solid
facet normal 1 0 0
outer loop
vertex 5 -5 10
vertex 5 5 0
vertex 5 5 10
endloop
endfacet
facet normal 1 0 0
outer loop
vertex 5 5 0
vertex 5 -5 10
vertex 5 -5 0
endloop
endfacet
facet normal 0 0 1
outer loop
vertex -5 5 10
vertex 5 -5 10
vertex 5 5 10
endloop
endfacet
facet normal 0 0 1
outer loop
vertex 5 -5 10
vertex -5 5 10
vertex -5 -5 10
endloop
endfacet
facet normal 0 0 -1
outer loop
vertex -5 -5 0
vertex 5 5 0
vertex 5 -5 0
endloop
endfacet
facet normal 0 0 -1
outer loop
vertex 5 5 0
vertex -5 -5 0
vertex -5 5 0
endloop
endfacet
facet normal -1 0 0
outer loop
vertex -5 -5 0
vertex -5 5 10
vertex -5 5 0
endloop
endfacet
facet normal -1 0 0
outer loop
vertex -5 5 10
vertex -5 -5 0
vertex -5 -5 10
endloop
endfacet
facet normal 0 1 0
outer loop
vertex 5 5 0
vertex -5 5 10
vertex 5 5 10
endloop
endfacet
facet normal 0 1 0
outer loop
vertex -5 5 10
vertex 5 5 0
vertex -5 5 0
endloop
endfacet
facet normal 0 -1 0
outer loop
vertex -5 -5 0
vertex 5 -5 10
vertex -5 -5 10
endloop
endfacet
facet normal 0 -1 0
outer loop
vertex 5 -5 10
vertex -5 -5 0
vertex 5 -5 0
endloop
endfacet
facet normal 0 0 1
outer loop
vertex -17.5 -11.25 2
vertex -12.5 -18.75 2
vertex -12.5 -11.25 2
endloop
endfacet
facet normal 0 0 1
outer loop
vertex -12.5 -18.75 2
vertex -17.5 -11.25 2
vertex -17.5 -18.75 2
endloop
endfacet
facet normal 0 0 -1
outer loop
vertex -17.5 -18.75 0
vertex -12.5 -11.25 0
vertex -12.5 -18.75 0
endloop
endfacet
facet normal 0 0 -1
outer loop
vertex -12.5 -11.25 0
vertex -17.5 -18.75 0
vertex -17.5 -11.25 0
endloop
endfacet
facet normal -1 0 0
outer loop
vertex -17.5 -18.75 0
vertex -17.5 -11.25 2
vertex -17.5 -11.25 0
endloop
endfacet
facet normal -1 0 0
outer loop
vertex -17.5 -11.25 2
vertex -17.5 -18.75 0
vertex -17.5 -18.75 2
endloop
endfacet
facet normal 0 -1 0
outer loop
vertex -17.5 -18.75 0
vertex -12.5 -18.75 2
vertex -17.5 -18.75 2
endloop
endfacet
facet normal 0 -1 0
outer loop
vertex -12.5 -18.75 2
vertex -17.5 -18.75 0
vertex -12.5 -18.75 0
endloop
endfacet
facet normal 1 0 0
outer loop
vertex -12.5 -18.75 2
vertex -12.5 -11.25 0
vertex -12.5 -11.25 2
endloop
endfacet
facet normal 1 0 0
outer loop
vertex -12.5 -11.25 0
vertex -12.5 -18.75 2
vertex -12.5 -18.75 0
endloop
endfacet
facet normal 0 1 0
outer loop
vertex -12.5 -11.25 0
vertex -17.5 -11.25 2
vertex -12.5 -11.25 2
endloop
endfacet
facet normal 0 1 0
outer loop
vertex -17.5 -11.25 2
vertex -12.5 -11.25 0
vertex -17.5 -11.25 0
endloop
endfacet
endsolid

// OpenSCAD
translate([0, 0, 5]) color([0,1,0,0.9]) cube([10, 10, 10], center=true);
translate([-17.25, -18.5, 1]) color([1,0,0]) cube([0.5, 0.5, 2], center=true);
translate([-16.75, -18.5, 1]) color([1,0,0]) cube([0.5, 0.5, 2], center=true);
translate([-16.25, -18.5, 1]) color([1,0,0]) cube([0.5, 0.5, 2], center=true);
translate([-15.75, -18.5, 1]) color([1,0,0]) cube([0.5, 0.5, 2], center=true);
translate([-15.25, -18.5, 1]) color([1,0,0]) cube([0.5, 0.5, 2], center=true);
translate([-14.75, -18.5, 1]) color([1,0,0]) cube([0.5, 0.5, 2], center=true);
translate([-14.25, -18.5, 1]) color([1,0,0]) cube([0.5, 0.5, 2], center=true);
translate([-13.75, -18.5, 1]) color([1,0,0]) cube([0.5, 0.5, 2], center=true);
translate([-13.25, -18.5, 1]) color([1,0,0]) cube([0.5, 0.5, 2], center=true);
translate([-12.75, -18.5, 1]) color([1,0,0]) cube([0.5, 0.5, 2], center=true);
translate([-17.25, -18.0, 1]) color([1,0,0]) cube([0.5, 0.5, 2], center=true);
translate([-16.75, -18.0, 1]) color([1,0,0]) cube([0.5, 0.5, 2], center=true);
translate([-16.25, -18.0, 1]) color([1,0,0]) cube([0.5, 0.5, 2], center=true);
translate([-15.75, -18.0, 1]) color([1,0,0]) cube([0.5, 0.5, 2], center=true);
translate([-15.25, -18.0, 1]) color([1,0,0]) cube([0.5, 0.5, 2], center=true);
translate([-14.75, -18.0, 1]) color([1,0,0]) cube([0.5, 0.5, 2], center=true);
translate([-14.25, -18.0, 1]) color([1,0,0]) cube([0.5, 0.5, 2], center=true);
translate([-13.75, -18.0, 1]) color([1,0,0]) cube([0.5, 0.5, 2], center=true);
translate([-13.25, -18.0, 1]) color([1,0,0]) cube([0.5, 0.5, 2], center=true);
translate([-12.75, -18.0, 1]) color([1,0,0]) cube([0.5, 0.5, 2], center=true);
translate([-17.25, -17.5, 1]) color([1,0,0]) cube([0.5, 0.5, 2], center=true);
translate([-16.75, -17.5, 1]) color([1,0,0]) cube([0.5, 0.5, 2], center=true);
translate([-16.25, -17.5, 1]) color([1,0,0]) cube([0.5, 0.5, 2], center=true);
translate([-15.75, -17.5, 1]) color([1,0,0]) cube([0.5, 0.5, 2], center=true);
translate([-15.25, -17.5, 1]) color([1,0,0]) cube([0.5, 0.5, 2], center=true);
translate([-14.75, -17.5, 1]) color([1,0,0]) cube([0.5, 0.5, 2], center=true);
translate([-14.25, -17.5, 1]) color([1,0,0]) cube([0.5, 0.5, 2], center=true);
translate([-13.75, -17.5, 1]) color([1,0,0]) cube([0.5, 0.5, 2], center=true);
translate([-13.25, -17.5, 1]) color([1,0,0]) cube([0.5, 0.5, 2], center=true);
translate([-12.75, -17.5, 1]) color([1,0,0]) cube([0.5, 0.5, 2], center=true);
translate([-17.25, -17.0, 1]) color([1,0,0]) cube([0.5, 0.5, 2], center=true);
translate([-16.75, -17.0, 1]) color([1,0,0]) cube([0.5, 0.5, 2], center=true);
translate([-16.25, -17.0, 1]) color([1,0,0]) cube([0.5, 0.5, 2], center=true);
translate([-15.75, -17.0, 1]) color([1,0,0]) cube([0.5, 0.5, 2], center=true);
translate([-15.25, -17.0, 1]) color([1,0,0]) cube([0.5, 0.5, 2], center=true);
translate([-14.75, -17.0, 1]) color([1,0,0]) cube([0.5, 0.5, 2], center=true);
translate([-14.25, -17.0, 1]) color([1,0,0]) cube([0.5, 0.5, 2], center=true);
translate([-13.75, -17.0, 1]) color([1,0,0]) cube([0.5, 0.5, 2], center=true);
translate([-13.25, -17.0, 1]) color([1,0,0]) cube([0.5, 0.5, 2], center=true);
translate([-12.75, -17.0, 1]) color([1,0,0]) cube([0.5, 0.5, 2], center=true);
translate([-17.25, -16.5, 1]) color([1,0,0]) cube([0.5, 0.5, 2], center=true);
translate([-16.75, -16.5, 1]) color([1,0,0]) cube([0.5, 0.5, 2], center=true);
translate([-16.25, -16.5, 1]) color([1,0,0]) cube([0.5, 0.5, 2], center=true);
translate([-15.75, -16.5, 1]) color([1,0,0]) cube([0.5, 0.5, 2], center=true);
translate([-15.25, -16.5, 1]) color([1,0,0]) cube([0.5, 0.5, 2], center=true);
translate([-14.75, -16.5, 1]) color([1,0,0]) cube([0.5, 0.5, 2], center=true);
translate([-14.25, -16.5, 1]) color([1,0,0]) cube([0.5, 0.5, 2], center=true);
translate([-13.75, -16.5, 1]) color([1,0,0]) cube([0.5, 0.5, 2], center=true);
translate([-13.25, -16.5, 1]) color([1,0,0]) cube([0.5, 0.5, 2], center=true);
translate([-12.75, -16.5, 1]) color([1,0,0]) cube([0.5, 0.5, 2], center=true);
translate([-17.25, -16.0, 1]) color([1,0,0]) cube([0.5, 0.5, 2], center=true);
translate([-16.75, -16.0, 1]) color([1,0,0]) cube([0.5, 0.5, 2], center=true);
translate([-16.25, -16.0, 1]) color([1,0,0]) cube([0.5, 0.5, 2], center=true);
translate([-15.75, -16.0, 1]) color([1,0,0]) cube([0.5, 0.5, 2], center=true);
translate([-15.25, -16.0, 1]) color([1,0,0]) cube([0.5, 0.5, 2], center=true);
translate([-14.75, -16.0, 1]) color([1,0,0]) cube([0.5, 0.5, 2], center=true);
translate([-14.25, -16.0, 1]) color([1,0,0]) cube([0.5, 0.5, 2], center=true);
translate([-13.75, -16.0, 1]) color([1,0,0]) cube([0.5, 0.5, 2], center=true);
translate([-13.25, -16.0, 1]) color([1,0,0]) cube([0.5, 0.5, 2], center=true);
translate([-12.75, -16.0, 1]) color([1,0,0]) cube([0.5, 0.5, 2], center=true);
translate([-17.25, -15.5, 1]) color([1,0,0]) cube([0.5, 0.5, 2], center=true);
translate([-16.75, -15.5, 1]) color([1,0,0]) cube([0.5, 0.5, 2], center=true);
translate([-16.25, -15.5, 1]) color([1,0,0]) cube([0.5, 0.5, 2], center=true);
translate([-15.75, -15.5, 1]) color([1,0,0]) cube([0.5, 0.5, 2], center=true);
translate([-15.25, -15.5, 1]) color([1,0,0]) cube([0.5, 0.5, 2], center=true);
translate([-14.75, -15.5, 1]) color([1,0,0]) cube([0.5, 0.5, 2], center=true);
translate([-14.25, -15.5, 1]) color([1,0,0]) cube([0.5, 0.5, 2], center=true);
translate([-13.75, -15.5, 1]) color([1,0,0]) cube([0.5, 0.5, 2], center=true);
translate([-13.25, -15.5, 1]) color([1,0,0]) cube([0.5, 0.5, 2], center=true);
translate([-12.75, -15.5, 1]) color([1,0,0]) cube([0.5, 0.5, 2], center=true);
translate([-17.25, -15.0, 1]) color([1,0,0]) cube([0.5, 0.5, 2], center=true);
translate([-16.75, -15.0, 1]) color([1,0,0]) cube([0.5, 0.5, 2], center=true);
translate([-16.25, -15.0, 1]) color([1,0,0]) cube([0.5, 0.5, 2], center=true);
translate([-15.75, -15.0, 1]) color([1,0,0]) cube([0.5, 0.5, 2], center=true);
translate([-15.25, -15.0, 1]) color([1,0,0]) cube([0.5, 0.5, 2], center=true);
translate([-14.75, -15.0, 1]) color([1,0,0]) cube([0.5, 0.5, 2], center=true);
translate([-14.25, -15.0, 1]) color([1,0,0]) cube([0.5, 0.5, 2], center=true);
translate([-13.75, -15.0, 1]) color([1,0,0]) cube([0.5, 0.5, 2], center=true);
translate([-13.25, -15.0, 1]) color([1,0,0]) cube([0.5, 0.5, 2], center=true);
translate([-12.75, -15.0, 1]) color([1,0,0]) cube([0.5, 0.5, 2], center=true);
translate([-17.25, -14.5, 1]) color([1,0,0]) cube([0.5, 0.5, 2], center=true);
translate([-16.75, -14.5, 1]) color([1,0,0]) cube([0.5, 0.5, 2], center=true);
translate([-16.25, -14.5, 1]) color([1,0,0]) cube([0.5, 0.5, 2], center=true);
translate([-15.75, -14.5, 1]) color([1,0,0]) cube([0.5, 0.5, 2], center=true);
translate([-15.25, -14.5, 1]) color([1,0,0]) cube([0.5, 0.5, 2], center=true);
translate([-14.75, -14.5, 1]) color([1,0,0]) cube([0.5, 0.5, 2], center=true);
translate([-14.25, -14.5, 1]) color([1,0,0]) cube([0.5, 0.5, 2], center=true);
translate([-13.75, -14.5, 1]) color([1,0,0]) cube([0.5, 0.5, 2], center=true);
translate([-13.25, -14.5, 1]) color([1,0,0]) cube([0.5, 0.5, 2], center=true);
translate([-12.75, -14.5, 1]) color([1,0,0]) cube([0.5, 0.5, 2], center=true);
translate([-17.25, -14.0, 1]) color([1,0,0]) cube([0.5, 0.5, 2], center=true);
translate([-16.75, -14.0, 1]) color([1,0,0]) cube([0.5, 0.5, 2], center=true);
translate([-16.25, -14.0, 1]) color([1,0,0]) cube([0.5, 0.5, 2], center=true);
translate([-15.75, -14.0, 1]) color([1,0,0]) cube([0.5, 0.5, 2], center=true);
translate([-15.25, -14.0, 1]) color([1,0,0]) cube([0.5, 0.5, 2], center=true);
translate([-14.75, -14.0, 1]) color([1,0,0]) cube([0.5, 0.5, 2], center=true);
translate([-14.25, -14.0, 1]) color([1,0,0]) cube([0.5, 0.5, 2], center=true);
translate([-13.75, -14.0, 1]) color([1,0,0]) cube([0.5, 0.5, 2], center=true);
translate([-13.25, -14.0, 1]) color([1,0,0]) cube([0.5, 0.5, 2], center=true);
translate([-12.75, -14.0, 1]) color([1,0,0]) cube([0.5, 0.5, 2], center=true);
translate([-17.25, -13.5, 1]) color([1,0,0]) cube([0.5, 0.5, 2], center=true);
translate([-16.75, -13.5, 1]) color([1,0,0]) cube([0.5, 0.5, 2], center=true);
translate([-16.25, -13.5, 1]) color([1,0,0]) cube([0.5, 0.5, 2], center=true);
translate([-15.75, -13.5, 1]) color([1,0,0]) cube([0.5, 0.5, 2], center=true);
translate([-15.25, -13.5, 1]) color([1,0,0]) cube([0.5, 0.5, 2], center=true);
translate([-14.75, -13.5, 1]) color([1,0,0]) cube([0.5, 0.5, 2], center=true);
translate([-14.25, -13.5, 1]) color([1,0,0]) cube([0.5, 0.5, 2], center=true);
translate([-13.75, -13.5, 1]) color([1,0,0]) cube([0.5, 0.5, 2], center=true);
translate([-13.25, -13.5, 1]) color([1,0,0]) cube([0.5, 0.5, 2], center=true);
translate([-12.75, -13.5, 1]) color([1,0,0]) cube([0.5, 0.5, 2], center=true);
translate([-17.25, -13.0, 1]) color([1,0,0]) cube([0.5, 0.5, 2], center=true);
translate([-16.75, -13.0, 1]) color([1,0,0]) cube([0.5, 0.5, 2], center=true);
translate([-16.25, -13.0, 1]) color([1,0,0]) cube([0.5, 0.5, 2], center=true);
translate([-15.75, -13.0, 1]) color([1,0,0]) cube([0.5, 0.5, 2], center=true);
translate([-15.25, -13.0, 1]) color([1,0,0]) cube([0.5, 0.5, 2], center=true);
translate([-14.75, -13.0, 1]) color([1,0,0]) cube([0.5, 0.5, 2], center=true);
translate([-14.25, -13.0, 1]) color([1,0,0]) cube([0.5, 0.5, 2], center=true);
translate([-13.75, -13.0, 1]) color([1,0,0]) cube([0.5, 0.5, 2], center=true);
translate([-13.25, -13.0, 1]) color([1,0,0]) cube([0.5, 0.5, 2], center=true);
translate([-12.75, -13.0, 1]) color([1,0,0]) cube([0.5, 0.5, 2], center=true);
translate([-17.25, -12.5, 1]) color([1,0,0]) cube([0.5, 0.5, 2], center=true);
translate([-16.75, -12.5, 1]) color([1,0,0]) cube([0.5, 0.5, 2], center=true);
translate([-16.25, -12.5, 1]) color([1,0,0]) cube([0.5, 0.5, 2], center=true);
translate([-15.75, -12.5, 1]) color([1,0,0]) cube([0.5, 0.5, 2], center=true);
translate([-15.25, -12.5, 1]) color([1,0,0]) cube([0.5, 0.5, 2], center=true);
translate([-14.75, -12.5, 1]) color([1,0,0]) cube([0.5, 0.5, 2], center=true);
translate([-14.25, -12.5, 1]) color([1,0,0]) cube([0.5, 0.5, 2], center=true);
translate([-13.75, -12.5, 1]) color([1,0,0]) cube([0.5, 0.5, 2], center=true);
translate([-13.25, -12.5, 1]) color([1,0,0]) cube([0.5, 0.5, 2], center=true);
translate([-12.75, -12.5, 1]) color([1,0,0]) cube([0.5, 0.5, 2], center=true);
translate([-17.25, -12.0, 1]) color([1,0,0]) cube([0.5, 0.5, 2], center=true);
translate([-16.75, -12.0, 1]) color([1,0,0]) cube([0.5, 0.5, 2], center=true);
translate([-16.25, -12.0, 1]) color([1,0,0]) cube([0.5, 0.5, 2], center=true);
translate([-15.75, -12.0, 1]) color([1,0,0]) cube([0.5, 0.5, 2], center=true);
translate([-15.25, -12.0, 1]) color([1,0,0]) cube([0.5, 0.5, 2], center=true);
translate([-14.75, -12.0, 1]) color([1,0,0]) cube([0.5, 0.5, 2], center=true);
translate([-14.25, -12.0, 1]) color([1,0,0]) cube([0.5, 0.5, 2], center=true);
translate([-13.75, -12.0, 1]) color([1,0,0]) cube([0.5, 0.5, 2], center=true);
translate([-13.25, -12.0, 1]) color([1,0,0]) cube([0.5, 0.5, 2], center=true);
translate([-12.75, -12.0, 1]) color([1,0,0]) cube([0.5, 0.5, 2], center=true);
translate([-17.25, -11.5, 1]) color([1,0,0]) cube([0.5, 0.5, 2], center=true);
translate([-16.75, -11.5, 1]) color([1,0,0]) cube([0.5, 0.5, 2], center=true);
translate([-16.25, -11.5, 1]) color([1,0,0]) cube([0.5, 0.5, 2], center=true);
translate([-15.75, -11.5, 1]) color([1,0,0]) cube([0.5, 0.5, 2], center=true);
translate([-15.25, -11.5, 1]) color([1,0,0]) cube([0.5, 0.5, 2], center=true);
translate([-14.75, -11.5, 1]) color([1,0,0]) cube([0.5, 0.5, 2], center=true);
translate([-14.25, -11.5, 1]) color([1,0,0]) cube([0.5, 0.5, 2], center=true);
translate([-13.75, -11.5, 1]) color([1,0,0]) cube([0.5, 0.5, 2], center=true);
translate([-13.25, -11.5, 1]) color([1,0,0]) cube([0.5, 0.5, 2], center=true);
translate([-12.75, -11.5, 1]) color([1,0,0]) cube([0.5, 0.5, 2], center=true);
